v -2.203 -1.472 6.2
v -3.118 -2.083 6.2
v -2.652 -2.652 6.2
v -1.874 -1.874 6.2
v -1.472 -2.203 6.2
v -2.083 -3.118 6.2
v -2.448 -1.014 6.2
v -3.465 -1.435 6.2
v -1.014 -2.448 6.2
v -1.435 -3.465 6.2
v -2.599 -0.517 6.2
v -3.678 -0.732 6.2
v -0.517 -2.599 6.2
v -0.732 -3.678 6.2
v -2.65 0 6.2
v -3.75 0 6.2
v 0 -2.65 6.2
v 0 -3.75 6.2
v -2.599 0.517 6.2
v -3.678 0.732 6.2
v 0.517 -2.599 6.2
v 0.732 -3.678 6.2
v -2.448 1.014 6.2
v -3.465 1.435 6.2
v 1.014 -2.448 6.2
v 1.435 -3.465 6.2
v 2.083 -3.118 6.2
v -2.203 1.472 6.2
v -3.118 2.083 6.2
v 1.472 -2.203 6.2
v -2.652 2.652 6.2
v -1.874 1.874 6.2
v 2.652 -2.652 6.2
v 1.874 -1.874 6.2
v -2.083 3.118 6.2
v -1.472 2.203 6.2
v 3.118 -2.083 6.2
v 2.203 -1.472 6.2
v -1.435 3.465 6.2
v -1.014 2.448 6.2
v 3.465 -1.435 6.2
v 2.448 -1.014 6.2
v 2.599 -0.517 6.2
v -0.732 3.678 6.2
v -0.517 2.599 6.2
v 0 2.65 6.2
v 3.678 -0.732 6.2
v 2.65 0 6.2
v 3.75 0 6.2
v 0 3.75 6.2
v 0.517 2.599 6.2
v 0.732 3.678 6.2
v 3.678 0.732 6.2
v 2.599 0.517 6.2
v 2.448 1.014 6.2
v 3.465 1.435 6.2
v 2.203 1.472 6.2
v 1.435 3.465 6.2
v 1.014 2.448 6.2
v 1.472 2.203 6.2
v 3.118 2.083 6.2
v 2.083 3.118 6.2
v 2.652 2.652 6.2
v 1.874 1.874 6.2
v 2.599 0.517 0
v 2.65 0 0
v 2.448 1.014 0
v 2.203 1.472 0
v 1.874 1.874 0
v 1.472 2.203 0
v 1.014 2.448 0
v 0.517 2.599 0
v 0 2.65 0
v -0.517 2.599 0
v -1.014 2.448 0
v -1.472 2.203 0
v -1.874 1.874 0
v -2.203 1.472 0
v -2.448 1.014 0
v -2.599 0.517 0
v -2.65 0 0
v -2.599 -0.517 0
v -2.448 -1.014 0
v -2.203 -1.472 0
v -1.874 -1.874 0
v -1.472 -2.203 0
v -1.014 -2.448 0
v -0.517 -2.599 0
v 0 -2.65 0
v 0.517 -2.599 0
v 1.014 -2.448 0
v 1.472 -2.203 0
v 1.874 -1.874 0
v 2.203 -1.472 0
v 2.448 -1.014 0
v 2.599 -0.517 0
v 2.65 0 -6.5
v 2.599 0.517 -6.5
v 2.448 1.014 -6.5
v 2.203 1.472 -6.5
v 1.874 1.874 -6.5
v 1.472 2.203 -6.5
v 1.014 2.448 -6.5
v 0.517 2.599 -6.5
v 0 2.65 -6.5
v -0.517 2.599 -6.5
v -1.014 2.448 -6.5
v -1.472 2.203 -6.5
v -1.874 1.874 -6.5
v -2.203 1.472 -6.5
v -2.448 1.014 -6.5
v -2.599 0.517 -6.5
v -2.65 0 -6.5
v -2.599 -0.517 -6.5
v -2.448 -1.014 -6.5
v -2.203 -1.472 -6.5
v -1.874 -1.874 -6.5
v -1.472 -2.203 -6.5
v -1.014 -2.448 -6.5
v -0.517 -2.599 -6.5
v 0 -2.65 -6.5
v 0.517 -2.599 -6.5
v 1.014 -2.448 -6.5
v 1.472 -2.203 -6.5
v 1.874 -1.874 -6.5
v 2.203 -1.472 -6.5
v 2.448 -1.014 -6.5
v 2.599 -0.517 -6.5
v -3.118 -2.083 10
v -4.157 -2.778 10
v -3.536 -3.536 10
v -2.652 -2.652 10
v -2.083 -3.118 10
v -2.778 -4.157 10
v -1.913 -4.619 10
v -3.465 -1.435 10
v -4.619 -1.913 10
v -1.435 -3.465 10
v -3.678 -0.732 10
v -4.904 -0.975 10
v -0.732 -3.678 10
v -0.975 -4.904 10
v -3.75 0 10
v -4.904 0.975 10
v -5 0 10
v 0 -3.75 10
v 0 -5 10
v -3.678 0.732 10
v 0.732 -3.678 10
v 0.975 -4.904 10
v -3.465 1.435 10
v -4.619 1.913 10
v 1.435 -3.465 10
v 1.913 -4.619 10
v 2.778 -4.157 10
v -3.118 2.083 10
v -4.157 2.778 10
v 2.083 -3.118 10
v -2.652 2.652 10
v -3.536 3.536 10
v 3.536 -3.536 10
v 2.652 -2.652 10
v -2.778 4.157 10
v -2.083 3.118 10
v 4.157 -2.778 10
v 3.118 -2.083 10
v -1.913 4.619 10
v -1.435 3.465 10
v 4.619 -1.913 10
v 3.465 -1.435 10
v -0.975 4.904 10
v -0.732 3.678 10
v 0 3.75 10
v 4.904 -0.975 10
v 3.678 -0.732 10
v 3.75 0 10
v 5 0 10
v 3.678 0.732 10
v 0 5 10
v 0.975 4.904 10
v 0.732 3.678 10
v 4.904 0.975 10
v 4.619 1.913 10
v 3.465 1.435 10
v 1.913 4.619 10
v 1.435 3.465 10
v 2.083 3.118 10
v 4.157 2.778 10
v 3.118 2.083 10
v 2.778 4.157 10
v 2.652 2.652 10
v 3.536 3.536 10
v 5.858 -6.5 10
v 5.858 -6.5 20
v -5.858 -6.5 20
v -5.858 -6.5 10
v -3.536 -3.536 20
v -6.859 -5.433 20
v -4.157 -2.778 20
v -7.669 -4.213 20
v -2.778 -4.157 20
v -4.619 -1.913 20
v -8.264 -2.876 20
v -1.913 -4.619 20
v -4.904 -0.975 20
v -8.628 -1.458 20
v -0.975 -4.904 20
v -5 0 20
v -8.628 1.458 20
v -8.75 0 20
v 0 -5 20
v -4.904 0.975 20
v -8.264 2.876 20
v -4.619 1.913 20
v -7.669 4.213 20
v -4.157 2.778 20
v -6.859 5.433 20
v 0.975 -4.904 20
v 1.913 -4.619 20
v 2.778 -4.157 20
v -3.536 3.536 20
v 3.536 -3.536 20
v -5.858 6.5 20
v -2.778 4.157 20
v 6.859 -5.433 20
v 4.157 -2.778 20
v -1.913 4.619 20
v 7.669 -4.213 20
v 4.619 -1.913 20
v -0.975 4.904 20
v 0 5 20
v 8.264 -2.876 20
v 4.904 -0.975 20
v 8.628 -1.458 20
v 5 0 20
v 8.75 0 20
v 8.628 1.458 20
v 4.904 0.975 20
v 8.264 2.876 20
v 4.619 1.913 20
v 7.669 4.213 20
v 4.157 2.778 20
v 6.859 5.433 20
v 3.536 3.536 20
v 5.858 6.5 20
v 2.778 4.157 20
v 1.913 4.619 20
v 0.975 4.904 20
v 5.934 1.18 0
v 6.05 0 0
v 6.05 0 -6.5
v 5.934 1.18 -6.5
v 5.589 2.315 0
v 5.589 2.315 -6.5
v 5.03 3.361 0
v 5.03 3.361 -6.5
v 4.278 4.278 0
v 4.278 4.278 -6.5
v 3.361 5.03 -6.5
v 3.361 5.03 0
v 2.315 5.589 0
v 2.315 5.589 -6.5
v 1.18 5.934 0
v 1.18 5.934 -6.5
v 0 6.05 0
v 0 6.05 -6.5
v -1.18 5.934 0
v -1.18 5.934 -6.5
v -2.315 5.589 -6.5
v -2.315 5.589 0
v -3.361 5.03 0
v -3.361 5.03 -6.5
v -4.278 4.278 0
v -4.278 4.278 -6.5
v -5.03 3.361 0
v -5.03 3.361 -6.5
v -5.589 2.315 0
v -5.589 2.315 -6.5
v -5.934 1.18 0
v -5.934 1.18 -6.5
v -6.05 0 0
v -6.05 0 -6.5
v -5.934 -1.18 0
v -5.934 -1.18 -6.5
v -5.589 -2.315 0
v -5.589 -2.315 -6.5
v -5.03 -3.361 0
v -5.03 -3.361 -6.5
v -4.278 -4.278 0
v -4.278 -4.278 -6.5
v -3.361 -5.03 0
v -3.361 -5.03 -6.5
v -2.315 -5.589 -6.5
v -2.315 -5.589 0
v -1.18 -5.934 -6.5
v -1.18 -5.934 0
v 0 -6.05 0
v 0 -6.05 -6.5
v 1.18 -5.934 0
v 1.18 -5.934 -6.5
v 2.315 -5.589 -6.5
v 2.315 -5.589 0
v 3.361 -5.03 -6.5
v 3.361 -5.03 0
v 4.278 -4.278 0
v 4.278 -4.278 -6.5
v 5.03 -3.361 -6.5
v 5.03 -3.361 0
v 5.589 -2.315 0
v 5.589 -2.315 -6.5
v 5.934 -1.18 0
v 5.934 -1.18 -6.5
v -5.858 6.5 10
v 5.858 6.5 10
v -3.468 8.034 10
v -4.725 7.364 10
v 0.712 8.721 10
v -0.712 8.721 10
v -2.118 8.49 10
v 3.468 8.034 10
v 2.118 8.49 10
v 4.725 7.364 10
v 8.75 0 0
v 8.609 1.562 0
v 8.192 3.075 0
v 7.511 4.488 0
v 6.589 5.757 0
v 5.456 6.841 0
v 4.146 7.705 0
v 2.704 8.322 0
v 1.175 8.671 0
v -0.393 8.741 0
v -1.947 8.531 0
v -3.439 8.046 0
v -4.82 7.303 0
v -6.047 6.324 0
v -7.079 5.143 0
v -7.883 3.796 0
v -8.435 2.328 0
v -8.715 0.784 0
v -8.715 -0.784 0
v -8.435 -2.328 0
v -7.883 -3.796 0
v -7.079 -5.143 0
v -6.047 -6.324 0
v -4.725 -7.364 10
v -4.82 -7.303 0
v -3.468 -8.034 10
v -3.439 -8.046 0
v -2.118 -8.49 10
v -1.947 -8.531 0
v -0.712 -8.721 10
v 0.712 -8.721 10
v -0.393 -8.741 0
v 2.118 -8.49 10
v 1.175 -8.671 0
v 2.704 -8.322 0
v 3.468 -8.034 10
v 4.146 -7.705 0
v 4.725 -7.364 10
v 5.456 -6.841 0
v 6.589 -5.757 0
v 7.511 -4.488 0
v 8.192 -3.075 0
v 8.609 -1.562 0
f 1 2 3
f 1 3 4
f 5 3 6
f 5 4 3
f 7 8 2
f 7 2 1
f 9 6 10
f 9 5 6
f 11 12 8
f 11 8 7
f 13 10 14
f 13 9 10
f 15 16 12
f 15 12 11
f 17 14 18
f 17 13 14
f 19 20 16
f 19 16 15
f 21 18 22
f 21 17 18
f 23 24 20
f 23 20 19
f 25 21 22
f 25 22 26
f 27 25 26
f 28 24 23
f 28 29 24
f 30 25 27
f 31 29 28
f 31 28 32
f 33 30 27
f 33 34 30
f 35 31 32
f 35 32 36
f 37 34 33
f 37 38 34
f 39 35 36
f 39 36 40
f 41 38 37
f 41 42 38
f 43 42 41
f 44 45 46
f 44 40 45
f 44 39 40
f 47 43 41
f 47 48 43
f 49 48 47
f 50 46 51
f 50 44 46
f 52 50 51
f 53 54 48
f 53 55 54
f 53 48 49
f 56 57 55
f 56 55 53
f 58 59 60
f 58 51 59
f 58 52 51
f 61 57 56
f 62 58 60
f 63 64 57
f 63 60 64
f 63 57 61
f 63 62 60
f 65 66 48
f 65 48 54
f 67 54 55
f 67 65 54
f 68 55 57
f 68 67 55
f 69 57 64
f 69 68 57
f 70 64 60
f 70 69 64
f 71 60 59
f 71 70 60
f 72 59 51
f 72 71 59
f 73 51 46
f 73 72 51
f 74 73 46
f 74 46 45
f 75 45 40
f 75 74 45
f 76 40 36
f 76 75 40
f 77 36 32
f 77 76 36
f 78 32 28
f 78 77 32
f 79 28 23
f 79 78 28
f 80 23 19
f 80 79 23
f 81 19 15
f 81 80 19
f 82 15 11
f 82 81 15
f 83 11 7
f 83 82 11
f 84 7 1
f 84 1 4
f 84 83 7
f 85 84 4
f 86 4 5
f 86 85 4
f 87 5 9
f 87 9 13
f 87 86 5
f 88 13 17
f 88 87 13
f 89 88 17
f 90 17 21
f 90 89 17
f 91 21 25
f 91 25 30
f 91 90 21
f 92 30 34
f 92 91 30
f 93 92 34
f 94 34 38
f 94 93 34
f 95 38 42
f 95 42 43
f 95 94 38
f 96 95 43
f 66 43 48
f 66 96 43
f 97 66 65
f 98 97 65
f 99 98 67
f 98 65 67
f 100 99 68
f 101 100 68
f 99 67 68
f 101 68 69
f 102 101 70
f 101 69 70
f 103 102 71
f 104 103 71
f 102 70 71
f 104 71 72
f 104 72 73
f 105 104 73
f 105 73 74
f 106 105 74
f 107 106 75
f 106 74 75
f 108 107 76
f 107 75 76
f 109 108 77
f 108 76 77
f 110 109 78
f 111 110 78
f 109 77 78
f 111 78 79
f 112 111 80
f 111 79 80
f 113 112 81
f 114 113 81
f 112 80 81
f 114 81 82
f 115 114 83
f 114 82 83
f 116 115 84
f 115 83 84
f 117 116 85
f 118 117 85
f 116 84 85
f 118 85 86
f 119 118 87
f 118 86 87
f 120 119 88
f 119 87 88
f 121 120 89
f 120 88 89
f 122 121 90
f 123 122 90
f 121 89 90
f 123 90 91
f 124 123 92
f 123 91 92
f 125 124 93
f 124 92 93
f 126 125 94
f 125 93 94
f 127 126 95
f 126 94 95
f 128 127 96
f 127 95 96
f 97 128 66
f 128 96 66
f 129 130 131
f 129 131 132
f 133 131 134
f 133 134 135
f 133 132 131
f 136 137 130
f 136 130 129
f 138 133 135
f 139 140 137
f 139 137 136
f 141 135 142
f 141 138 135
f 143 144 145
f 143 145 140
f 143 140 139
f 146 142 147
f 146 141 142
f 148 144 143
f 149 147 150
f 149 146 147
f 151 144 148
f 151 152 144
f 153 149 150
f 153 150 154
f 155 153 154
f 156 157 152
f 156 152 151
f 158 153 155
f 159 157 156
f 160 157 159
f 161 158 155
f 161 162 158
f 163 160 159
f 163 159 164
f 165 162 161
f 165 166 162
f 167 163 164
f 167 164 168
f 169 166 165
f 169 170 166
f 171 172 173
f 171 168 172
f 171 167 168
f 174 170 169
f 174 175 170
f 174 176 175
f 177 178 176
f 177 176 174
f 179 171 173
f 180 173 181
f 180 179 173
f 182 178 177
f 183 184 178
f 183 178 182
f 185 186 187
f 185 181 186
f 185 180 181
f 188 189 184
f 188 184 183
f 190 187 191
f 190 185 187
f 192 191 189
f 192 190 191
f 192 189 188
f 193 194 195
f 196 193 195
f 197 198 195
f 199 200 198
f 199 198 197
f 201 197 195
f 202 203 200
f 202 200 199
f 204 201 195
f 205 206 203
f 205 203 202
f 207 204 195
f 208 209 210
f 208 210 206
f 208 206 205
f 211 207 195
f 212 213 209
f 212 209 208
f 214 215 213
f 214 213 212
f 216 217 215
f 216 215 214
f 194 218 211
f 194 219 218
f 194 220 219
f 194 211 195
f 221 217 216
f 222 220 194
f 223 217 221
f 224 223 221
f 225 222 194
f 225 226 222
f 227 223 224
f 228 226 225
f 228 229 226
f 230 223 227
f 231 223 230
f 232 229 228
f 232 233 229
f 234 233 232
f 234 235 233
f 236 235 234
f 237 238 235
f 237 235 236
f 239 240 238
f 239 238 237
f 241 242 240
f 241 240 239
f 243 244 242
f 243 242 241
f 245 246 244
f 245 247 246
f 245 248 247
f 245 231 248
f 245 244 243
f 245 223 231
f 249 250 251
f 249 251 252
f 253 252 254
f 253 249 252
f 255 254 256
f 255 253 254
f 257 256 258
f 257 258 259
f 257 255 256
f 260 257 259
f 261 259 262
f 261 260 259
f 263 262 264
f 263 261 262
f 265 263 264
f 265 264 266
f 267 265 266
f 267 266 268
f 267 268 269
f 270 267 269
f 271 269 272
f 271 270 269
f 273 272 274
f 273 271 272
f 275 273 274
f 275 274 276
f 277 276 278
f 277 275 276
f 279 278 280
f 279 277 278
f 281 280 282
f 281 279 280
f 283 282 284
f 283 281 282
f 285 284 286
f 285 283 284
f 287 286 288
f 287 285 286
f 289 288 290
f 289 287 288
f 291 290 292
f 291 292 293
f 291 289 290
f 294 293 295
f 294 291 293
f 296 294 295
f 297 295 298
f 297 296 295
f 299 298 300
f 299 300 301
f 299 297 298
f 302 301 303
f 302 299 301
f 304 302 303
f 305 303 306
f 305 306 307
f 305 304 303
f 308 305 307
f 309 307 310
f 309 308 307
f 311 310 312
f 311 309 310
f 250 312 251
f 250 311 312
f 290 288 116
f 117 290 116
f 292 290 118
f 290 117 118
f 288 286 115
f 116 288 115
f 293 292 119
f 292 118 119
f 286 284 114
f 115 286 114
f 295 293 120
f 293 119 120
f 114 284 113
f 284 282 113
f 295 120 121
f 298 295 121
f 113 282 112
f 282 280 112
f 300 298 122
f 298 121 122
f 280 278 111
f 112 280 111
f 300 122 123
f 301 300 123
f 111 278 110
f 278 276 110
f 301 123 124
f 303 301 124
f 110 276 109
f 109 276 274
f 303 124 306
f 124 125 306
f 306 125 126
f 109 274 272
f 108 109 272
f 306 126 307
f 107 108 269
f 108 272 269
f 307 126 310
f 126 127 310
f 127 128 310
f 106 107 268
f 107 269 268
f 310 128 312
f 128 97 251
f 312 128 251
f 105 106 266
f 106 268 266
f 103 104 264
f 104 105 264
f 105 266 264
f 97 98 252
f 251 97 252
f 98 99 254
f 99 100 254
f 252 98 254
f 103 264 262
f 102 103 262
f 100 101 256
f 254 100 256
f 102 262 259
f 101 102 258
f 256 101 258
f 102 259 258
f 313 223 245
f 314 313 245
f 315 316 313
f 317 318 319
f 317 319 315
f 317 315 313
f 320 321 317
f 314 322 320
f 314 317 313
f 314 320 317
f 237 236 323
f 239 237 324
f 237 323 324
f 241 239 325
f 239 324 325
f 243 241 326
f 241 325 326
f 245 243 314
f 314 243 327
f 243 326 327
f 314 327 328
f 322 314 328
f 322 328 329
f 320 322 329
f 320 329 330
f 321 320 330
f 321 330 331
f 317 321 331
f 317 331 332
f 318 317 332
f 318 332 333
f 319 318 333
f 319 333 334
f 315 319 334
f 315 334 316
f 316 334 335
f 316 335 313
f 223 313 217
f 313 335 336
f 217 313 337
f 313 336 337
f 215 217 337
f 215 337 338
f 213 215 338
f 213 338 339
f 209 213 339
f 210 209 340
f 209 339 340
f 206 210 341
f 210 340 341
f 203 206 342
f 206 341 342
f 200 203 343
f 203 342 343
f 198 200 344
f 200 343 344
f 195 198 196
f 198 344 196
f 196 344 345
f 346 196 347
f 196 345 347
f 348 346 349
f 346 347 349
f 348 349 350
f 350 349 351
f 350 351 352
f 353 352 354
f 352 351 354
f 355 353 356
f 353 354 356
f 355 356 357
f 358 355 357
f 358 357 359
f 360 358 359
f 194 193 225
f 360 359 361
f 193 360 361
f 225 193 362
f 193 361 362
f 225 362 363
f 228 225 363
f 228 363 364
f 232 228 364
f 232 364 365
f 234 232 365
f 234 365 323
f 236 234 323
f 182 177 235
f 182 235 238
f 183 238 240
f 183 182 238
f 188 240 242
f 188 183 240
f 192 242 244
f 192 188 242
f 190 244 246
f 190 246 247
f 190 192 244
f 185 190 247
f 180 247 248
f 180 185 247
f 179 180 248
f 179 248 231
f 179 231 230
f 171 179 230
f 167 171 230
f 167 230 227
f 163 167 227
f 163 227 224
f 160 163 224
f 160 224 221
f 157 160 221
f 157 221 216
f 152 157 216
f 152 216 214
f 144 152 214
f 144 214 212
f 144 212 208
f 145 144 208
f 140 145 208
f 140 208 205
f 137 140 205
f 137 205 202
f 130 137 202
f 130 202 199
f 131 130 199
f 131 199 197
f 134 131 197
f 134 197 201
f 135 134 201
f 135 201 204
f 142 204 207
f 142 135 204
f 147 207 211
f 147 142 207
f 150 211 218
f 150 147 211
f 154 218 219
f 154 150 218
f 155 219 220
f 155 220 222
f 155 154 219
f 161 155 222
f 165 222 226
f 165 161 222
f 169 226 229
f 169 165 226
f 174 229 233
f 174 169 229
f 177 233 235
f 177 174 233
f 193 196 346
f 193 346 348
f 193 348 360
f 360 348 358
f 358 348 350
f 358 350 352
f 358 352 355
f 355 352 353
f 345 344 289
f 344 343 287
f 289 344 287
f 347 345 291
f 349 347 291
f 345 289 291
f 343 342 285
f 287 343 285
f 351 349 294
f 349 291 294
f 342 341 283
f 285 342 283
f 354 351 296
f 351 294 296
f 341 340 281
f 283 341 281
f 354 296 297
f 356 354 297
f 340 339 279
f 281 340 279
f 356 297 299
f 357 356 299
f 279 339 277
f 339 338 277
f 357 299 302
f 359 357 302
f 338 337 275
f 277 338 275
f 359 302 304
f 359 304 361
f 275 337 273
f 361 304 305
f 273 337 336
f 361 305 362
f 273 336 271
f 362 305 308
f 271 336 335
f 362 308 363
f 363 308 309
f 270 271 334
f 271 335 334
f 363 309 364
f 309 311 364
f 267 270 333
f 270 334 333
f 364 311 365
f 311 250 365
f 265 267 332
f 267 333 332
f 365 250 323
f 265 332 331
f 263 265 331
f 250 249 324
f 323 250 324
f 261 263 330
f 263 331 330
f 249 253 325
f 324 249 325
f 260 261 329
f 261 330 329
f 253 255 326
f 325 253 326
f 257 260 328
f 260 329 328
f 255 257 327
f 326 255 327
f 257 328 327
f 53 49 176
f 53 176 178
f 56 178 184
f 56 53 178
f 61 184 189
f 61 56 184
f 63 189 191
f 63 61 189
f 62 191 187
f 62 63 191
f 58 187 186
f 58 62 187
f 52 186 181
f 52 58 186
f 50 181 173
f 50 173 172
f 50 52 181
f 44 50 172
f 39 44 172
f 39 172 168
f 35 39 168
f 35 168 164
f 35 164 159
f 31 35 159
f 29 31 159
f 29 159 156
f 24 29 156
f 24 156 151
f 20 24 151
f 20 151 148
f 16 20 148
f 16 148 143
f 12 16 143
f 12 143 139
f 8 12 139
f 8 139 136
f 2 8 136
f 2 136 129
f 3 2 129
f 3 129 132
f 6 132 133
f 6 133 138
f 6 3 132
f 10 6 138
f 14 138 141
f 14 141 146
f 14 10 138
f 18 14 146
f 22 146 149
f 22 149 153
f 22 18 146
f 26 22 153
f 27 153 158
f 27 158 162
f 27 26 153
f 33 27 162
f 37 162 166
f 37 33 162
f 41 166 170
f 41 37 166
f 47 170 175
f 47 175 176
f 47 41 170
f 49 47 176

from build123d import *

# Parameters (mm, degrees)
F0_R     = 8.75
F0_R_2   = 6.05
F0_R_3   = 5
F1_DEPTH = 20
F0_R_4   = 3.75
F2_DEPTH = 10
F0_R_5   = 2.65
F3_DEPTH = 6.2
F5_DEPTH = 10
F6_DEPTH = 6.5


with BuildPart() as f1:
    # F0 (on Top) → F1 (new body)
    with BuildSketch(Plane.XY):
        Circle(F0_R)
        Circle(F0_R_2, mode=Mode.SUBTRACT)
        Circle(F0_R_2)
        Circle(F0_R_3, mode=Mode.SUBTRACT)
    extrude(amount=F1_DEPTH)

    # F4 (on face) → F5 (cut)
    with BuildSketch(Plane.XY.offset(20)):
        with BuildLine():
            ThreePointArc((-5.8576872569, -6.5), (0, -8.75), (5.8576872569, -6.5))
            Line((5.8576872569, -6.5), (-5.8576872569, -6.5))
        make_face()
        with BuildLine():
            Line((-5.8576872569, 6.5), (5.8576872569, 6.5))
            ThreePointArc((5.8576872569, 6.5), (0, 8.75), (-5.8576872569, 6.5))
        make_face()
    extrude(amount=-F5_DEPTH, mode=Mode.SUBTRACT)



with BuildPart() as f2:
    # F0 (on Top) → F2 (new body)
    with BuildSketch(Plane.XY):
        Circle(F0_R_3)
        Circle(F0_R_4, mode=Mode.SUBTRACT)
    extrude(amount=F2_DEPTH)

    # F0 (on Top) → F3 (join)
    with BuildSketch(Plane.XY):
        Circle(F0_R_4)
        Circle(F0_R_5, mode=Mode.SUBTRACT)
    extrude(amount=F3_DEPTH)


with BuildPart() as f1_1:
    add(f1.part)

    add(f2.part)  # F6 merges F2
    # F0 (on Top) → F6 (join)
    with BuildSketch(Plane.XY):
        Circle(F0_R_2)
        Circle(F0_R_3, mode=Mode.SUBTRACT)
        Circle(F0_R_3)
        Circle(F0_R_4, mode=Mode.SUBTRACT)
        Circle(F0_R_4)
        Circle(F0_R_5, mode=Mode.SUBTRACT)
    extrude(amount=-F6_DEPTH)


solid = f1_1.part
